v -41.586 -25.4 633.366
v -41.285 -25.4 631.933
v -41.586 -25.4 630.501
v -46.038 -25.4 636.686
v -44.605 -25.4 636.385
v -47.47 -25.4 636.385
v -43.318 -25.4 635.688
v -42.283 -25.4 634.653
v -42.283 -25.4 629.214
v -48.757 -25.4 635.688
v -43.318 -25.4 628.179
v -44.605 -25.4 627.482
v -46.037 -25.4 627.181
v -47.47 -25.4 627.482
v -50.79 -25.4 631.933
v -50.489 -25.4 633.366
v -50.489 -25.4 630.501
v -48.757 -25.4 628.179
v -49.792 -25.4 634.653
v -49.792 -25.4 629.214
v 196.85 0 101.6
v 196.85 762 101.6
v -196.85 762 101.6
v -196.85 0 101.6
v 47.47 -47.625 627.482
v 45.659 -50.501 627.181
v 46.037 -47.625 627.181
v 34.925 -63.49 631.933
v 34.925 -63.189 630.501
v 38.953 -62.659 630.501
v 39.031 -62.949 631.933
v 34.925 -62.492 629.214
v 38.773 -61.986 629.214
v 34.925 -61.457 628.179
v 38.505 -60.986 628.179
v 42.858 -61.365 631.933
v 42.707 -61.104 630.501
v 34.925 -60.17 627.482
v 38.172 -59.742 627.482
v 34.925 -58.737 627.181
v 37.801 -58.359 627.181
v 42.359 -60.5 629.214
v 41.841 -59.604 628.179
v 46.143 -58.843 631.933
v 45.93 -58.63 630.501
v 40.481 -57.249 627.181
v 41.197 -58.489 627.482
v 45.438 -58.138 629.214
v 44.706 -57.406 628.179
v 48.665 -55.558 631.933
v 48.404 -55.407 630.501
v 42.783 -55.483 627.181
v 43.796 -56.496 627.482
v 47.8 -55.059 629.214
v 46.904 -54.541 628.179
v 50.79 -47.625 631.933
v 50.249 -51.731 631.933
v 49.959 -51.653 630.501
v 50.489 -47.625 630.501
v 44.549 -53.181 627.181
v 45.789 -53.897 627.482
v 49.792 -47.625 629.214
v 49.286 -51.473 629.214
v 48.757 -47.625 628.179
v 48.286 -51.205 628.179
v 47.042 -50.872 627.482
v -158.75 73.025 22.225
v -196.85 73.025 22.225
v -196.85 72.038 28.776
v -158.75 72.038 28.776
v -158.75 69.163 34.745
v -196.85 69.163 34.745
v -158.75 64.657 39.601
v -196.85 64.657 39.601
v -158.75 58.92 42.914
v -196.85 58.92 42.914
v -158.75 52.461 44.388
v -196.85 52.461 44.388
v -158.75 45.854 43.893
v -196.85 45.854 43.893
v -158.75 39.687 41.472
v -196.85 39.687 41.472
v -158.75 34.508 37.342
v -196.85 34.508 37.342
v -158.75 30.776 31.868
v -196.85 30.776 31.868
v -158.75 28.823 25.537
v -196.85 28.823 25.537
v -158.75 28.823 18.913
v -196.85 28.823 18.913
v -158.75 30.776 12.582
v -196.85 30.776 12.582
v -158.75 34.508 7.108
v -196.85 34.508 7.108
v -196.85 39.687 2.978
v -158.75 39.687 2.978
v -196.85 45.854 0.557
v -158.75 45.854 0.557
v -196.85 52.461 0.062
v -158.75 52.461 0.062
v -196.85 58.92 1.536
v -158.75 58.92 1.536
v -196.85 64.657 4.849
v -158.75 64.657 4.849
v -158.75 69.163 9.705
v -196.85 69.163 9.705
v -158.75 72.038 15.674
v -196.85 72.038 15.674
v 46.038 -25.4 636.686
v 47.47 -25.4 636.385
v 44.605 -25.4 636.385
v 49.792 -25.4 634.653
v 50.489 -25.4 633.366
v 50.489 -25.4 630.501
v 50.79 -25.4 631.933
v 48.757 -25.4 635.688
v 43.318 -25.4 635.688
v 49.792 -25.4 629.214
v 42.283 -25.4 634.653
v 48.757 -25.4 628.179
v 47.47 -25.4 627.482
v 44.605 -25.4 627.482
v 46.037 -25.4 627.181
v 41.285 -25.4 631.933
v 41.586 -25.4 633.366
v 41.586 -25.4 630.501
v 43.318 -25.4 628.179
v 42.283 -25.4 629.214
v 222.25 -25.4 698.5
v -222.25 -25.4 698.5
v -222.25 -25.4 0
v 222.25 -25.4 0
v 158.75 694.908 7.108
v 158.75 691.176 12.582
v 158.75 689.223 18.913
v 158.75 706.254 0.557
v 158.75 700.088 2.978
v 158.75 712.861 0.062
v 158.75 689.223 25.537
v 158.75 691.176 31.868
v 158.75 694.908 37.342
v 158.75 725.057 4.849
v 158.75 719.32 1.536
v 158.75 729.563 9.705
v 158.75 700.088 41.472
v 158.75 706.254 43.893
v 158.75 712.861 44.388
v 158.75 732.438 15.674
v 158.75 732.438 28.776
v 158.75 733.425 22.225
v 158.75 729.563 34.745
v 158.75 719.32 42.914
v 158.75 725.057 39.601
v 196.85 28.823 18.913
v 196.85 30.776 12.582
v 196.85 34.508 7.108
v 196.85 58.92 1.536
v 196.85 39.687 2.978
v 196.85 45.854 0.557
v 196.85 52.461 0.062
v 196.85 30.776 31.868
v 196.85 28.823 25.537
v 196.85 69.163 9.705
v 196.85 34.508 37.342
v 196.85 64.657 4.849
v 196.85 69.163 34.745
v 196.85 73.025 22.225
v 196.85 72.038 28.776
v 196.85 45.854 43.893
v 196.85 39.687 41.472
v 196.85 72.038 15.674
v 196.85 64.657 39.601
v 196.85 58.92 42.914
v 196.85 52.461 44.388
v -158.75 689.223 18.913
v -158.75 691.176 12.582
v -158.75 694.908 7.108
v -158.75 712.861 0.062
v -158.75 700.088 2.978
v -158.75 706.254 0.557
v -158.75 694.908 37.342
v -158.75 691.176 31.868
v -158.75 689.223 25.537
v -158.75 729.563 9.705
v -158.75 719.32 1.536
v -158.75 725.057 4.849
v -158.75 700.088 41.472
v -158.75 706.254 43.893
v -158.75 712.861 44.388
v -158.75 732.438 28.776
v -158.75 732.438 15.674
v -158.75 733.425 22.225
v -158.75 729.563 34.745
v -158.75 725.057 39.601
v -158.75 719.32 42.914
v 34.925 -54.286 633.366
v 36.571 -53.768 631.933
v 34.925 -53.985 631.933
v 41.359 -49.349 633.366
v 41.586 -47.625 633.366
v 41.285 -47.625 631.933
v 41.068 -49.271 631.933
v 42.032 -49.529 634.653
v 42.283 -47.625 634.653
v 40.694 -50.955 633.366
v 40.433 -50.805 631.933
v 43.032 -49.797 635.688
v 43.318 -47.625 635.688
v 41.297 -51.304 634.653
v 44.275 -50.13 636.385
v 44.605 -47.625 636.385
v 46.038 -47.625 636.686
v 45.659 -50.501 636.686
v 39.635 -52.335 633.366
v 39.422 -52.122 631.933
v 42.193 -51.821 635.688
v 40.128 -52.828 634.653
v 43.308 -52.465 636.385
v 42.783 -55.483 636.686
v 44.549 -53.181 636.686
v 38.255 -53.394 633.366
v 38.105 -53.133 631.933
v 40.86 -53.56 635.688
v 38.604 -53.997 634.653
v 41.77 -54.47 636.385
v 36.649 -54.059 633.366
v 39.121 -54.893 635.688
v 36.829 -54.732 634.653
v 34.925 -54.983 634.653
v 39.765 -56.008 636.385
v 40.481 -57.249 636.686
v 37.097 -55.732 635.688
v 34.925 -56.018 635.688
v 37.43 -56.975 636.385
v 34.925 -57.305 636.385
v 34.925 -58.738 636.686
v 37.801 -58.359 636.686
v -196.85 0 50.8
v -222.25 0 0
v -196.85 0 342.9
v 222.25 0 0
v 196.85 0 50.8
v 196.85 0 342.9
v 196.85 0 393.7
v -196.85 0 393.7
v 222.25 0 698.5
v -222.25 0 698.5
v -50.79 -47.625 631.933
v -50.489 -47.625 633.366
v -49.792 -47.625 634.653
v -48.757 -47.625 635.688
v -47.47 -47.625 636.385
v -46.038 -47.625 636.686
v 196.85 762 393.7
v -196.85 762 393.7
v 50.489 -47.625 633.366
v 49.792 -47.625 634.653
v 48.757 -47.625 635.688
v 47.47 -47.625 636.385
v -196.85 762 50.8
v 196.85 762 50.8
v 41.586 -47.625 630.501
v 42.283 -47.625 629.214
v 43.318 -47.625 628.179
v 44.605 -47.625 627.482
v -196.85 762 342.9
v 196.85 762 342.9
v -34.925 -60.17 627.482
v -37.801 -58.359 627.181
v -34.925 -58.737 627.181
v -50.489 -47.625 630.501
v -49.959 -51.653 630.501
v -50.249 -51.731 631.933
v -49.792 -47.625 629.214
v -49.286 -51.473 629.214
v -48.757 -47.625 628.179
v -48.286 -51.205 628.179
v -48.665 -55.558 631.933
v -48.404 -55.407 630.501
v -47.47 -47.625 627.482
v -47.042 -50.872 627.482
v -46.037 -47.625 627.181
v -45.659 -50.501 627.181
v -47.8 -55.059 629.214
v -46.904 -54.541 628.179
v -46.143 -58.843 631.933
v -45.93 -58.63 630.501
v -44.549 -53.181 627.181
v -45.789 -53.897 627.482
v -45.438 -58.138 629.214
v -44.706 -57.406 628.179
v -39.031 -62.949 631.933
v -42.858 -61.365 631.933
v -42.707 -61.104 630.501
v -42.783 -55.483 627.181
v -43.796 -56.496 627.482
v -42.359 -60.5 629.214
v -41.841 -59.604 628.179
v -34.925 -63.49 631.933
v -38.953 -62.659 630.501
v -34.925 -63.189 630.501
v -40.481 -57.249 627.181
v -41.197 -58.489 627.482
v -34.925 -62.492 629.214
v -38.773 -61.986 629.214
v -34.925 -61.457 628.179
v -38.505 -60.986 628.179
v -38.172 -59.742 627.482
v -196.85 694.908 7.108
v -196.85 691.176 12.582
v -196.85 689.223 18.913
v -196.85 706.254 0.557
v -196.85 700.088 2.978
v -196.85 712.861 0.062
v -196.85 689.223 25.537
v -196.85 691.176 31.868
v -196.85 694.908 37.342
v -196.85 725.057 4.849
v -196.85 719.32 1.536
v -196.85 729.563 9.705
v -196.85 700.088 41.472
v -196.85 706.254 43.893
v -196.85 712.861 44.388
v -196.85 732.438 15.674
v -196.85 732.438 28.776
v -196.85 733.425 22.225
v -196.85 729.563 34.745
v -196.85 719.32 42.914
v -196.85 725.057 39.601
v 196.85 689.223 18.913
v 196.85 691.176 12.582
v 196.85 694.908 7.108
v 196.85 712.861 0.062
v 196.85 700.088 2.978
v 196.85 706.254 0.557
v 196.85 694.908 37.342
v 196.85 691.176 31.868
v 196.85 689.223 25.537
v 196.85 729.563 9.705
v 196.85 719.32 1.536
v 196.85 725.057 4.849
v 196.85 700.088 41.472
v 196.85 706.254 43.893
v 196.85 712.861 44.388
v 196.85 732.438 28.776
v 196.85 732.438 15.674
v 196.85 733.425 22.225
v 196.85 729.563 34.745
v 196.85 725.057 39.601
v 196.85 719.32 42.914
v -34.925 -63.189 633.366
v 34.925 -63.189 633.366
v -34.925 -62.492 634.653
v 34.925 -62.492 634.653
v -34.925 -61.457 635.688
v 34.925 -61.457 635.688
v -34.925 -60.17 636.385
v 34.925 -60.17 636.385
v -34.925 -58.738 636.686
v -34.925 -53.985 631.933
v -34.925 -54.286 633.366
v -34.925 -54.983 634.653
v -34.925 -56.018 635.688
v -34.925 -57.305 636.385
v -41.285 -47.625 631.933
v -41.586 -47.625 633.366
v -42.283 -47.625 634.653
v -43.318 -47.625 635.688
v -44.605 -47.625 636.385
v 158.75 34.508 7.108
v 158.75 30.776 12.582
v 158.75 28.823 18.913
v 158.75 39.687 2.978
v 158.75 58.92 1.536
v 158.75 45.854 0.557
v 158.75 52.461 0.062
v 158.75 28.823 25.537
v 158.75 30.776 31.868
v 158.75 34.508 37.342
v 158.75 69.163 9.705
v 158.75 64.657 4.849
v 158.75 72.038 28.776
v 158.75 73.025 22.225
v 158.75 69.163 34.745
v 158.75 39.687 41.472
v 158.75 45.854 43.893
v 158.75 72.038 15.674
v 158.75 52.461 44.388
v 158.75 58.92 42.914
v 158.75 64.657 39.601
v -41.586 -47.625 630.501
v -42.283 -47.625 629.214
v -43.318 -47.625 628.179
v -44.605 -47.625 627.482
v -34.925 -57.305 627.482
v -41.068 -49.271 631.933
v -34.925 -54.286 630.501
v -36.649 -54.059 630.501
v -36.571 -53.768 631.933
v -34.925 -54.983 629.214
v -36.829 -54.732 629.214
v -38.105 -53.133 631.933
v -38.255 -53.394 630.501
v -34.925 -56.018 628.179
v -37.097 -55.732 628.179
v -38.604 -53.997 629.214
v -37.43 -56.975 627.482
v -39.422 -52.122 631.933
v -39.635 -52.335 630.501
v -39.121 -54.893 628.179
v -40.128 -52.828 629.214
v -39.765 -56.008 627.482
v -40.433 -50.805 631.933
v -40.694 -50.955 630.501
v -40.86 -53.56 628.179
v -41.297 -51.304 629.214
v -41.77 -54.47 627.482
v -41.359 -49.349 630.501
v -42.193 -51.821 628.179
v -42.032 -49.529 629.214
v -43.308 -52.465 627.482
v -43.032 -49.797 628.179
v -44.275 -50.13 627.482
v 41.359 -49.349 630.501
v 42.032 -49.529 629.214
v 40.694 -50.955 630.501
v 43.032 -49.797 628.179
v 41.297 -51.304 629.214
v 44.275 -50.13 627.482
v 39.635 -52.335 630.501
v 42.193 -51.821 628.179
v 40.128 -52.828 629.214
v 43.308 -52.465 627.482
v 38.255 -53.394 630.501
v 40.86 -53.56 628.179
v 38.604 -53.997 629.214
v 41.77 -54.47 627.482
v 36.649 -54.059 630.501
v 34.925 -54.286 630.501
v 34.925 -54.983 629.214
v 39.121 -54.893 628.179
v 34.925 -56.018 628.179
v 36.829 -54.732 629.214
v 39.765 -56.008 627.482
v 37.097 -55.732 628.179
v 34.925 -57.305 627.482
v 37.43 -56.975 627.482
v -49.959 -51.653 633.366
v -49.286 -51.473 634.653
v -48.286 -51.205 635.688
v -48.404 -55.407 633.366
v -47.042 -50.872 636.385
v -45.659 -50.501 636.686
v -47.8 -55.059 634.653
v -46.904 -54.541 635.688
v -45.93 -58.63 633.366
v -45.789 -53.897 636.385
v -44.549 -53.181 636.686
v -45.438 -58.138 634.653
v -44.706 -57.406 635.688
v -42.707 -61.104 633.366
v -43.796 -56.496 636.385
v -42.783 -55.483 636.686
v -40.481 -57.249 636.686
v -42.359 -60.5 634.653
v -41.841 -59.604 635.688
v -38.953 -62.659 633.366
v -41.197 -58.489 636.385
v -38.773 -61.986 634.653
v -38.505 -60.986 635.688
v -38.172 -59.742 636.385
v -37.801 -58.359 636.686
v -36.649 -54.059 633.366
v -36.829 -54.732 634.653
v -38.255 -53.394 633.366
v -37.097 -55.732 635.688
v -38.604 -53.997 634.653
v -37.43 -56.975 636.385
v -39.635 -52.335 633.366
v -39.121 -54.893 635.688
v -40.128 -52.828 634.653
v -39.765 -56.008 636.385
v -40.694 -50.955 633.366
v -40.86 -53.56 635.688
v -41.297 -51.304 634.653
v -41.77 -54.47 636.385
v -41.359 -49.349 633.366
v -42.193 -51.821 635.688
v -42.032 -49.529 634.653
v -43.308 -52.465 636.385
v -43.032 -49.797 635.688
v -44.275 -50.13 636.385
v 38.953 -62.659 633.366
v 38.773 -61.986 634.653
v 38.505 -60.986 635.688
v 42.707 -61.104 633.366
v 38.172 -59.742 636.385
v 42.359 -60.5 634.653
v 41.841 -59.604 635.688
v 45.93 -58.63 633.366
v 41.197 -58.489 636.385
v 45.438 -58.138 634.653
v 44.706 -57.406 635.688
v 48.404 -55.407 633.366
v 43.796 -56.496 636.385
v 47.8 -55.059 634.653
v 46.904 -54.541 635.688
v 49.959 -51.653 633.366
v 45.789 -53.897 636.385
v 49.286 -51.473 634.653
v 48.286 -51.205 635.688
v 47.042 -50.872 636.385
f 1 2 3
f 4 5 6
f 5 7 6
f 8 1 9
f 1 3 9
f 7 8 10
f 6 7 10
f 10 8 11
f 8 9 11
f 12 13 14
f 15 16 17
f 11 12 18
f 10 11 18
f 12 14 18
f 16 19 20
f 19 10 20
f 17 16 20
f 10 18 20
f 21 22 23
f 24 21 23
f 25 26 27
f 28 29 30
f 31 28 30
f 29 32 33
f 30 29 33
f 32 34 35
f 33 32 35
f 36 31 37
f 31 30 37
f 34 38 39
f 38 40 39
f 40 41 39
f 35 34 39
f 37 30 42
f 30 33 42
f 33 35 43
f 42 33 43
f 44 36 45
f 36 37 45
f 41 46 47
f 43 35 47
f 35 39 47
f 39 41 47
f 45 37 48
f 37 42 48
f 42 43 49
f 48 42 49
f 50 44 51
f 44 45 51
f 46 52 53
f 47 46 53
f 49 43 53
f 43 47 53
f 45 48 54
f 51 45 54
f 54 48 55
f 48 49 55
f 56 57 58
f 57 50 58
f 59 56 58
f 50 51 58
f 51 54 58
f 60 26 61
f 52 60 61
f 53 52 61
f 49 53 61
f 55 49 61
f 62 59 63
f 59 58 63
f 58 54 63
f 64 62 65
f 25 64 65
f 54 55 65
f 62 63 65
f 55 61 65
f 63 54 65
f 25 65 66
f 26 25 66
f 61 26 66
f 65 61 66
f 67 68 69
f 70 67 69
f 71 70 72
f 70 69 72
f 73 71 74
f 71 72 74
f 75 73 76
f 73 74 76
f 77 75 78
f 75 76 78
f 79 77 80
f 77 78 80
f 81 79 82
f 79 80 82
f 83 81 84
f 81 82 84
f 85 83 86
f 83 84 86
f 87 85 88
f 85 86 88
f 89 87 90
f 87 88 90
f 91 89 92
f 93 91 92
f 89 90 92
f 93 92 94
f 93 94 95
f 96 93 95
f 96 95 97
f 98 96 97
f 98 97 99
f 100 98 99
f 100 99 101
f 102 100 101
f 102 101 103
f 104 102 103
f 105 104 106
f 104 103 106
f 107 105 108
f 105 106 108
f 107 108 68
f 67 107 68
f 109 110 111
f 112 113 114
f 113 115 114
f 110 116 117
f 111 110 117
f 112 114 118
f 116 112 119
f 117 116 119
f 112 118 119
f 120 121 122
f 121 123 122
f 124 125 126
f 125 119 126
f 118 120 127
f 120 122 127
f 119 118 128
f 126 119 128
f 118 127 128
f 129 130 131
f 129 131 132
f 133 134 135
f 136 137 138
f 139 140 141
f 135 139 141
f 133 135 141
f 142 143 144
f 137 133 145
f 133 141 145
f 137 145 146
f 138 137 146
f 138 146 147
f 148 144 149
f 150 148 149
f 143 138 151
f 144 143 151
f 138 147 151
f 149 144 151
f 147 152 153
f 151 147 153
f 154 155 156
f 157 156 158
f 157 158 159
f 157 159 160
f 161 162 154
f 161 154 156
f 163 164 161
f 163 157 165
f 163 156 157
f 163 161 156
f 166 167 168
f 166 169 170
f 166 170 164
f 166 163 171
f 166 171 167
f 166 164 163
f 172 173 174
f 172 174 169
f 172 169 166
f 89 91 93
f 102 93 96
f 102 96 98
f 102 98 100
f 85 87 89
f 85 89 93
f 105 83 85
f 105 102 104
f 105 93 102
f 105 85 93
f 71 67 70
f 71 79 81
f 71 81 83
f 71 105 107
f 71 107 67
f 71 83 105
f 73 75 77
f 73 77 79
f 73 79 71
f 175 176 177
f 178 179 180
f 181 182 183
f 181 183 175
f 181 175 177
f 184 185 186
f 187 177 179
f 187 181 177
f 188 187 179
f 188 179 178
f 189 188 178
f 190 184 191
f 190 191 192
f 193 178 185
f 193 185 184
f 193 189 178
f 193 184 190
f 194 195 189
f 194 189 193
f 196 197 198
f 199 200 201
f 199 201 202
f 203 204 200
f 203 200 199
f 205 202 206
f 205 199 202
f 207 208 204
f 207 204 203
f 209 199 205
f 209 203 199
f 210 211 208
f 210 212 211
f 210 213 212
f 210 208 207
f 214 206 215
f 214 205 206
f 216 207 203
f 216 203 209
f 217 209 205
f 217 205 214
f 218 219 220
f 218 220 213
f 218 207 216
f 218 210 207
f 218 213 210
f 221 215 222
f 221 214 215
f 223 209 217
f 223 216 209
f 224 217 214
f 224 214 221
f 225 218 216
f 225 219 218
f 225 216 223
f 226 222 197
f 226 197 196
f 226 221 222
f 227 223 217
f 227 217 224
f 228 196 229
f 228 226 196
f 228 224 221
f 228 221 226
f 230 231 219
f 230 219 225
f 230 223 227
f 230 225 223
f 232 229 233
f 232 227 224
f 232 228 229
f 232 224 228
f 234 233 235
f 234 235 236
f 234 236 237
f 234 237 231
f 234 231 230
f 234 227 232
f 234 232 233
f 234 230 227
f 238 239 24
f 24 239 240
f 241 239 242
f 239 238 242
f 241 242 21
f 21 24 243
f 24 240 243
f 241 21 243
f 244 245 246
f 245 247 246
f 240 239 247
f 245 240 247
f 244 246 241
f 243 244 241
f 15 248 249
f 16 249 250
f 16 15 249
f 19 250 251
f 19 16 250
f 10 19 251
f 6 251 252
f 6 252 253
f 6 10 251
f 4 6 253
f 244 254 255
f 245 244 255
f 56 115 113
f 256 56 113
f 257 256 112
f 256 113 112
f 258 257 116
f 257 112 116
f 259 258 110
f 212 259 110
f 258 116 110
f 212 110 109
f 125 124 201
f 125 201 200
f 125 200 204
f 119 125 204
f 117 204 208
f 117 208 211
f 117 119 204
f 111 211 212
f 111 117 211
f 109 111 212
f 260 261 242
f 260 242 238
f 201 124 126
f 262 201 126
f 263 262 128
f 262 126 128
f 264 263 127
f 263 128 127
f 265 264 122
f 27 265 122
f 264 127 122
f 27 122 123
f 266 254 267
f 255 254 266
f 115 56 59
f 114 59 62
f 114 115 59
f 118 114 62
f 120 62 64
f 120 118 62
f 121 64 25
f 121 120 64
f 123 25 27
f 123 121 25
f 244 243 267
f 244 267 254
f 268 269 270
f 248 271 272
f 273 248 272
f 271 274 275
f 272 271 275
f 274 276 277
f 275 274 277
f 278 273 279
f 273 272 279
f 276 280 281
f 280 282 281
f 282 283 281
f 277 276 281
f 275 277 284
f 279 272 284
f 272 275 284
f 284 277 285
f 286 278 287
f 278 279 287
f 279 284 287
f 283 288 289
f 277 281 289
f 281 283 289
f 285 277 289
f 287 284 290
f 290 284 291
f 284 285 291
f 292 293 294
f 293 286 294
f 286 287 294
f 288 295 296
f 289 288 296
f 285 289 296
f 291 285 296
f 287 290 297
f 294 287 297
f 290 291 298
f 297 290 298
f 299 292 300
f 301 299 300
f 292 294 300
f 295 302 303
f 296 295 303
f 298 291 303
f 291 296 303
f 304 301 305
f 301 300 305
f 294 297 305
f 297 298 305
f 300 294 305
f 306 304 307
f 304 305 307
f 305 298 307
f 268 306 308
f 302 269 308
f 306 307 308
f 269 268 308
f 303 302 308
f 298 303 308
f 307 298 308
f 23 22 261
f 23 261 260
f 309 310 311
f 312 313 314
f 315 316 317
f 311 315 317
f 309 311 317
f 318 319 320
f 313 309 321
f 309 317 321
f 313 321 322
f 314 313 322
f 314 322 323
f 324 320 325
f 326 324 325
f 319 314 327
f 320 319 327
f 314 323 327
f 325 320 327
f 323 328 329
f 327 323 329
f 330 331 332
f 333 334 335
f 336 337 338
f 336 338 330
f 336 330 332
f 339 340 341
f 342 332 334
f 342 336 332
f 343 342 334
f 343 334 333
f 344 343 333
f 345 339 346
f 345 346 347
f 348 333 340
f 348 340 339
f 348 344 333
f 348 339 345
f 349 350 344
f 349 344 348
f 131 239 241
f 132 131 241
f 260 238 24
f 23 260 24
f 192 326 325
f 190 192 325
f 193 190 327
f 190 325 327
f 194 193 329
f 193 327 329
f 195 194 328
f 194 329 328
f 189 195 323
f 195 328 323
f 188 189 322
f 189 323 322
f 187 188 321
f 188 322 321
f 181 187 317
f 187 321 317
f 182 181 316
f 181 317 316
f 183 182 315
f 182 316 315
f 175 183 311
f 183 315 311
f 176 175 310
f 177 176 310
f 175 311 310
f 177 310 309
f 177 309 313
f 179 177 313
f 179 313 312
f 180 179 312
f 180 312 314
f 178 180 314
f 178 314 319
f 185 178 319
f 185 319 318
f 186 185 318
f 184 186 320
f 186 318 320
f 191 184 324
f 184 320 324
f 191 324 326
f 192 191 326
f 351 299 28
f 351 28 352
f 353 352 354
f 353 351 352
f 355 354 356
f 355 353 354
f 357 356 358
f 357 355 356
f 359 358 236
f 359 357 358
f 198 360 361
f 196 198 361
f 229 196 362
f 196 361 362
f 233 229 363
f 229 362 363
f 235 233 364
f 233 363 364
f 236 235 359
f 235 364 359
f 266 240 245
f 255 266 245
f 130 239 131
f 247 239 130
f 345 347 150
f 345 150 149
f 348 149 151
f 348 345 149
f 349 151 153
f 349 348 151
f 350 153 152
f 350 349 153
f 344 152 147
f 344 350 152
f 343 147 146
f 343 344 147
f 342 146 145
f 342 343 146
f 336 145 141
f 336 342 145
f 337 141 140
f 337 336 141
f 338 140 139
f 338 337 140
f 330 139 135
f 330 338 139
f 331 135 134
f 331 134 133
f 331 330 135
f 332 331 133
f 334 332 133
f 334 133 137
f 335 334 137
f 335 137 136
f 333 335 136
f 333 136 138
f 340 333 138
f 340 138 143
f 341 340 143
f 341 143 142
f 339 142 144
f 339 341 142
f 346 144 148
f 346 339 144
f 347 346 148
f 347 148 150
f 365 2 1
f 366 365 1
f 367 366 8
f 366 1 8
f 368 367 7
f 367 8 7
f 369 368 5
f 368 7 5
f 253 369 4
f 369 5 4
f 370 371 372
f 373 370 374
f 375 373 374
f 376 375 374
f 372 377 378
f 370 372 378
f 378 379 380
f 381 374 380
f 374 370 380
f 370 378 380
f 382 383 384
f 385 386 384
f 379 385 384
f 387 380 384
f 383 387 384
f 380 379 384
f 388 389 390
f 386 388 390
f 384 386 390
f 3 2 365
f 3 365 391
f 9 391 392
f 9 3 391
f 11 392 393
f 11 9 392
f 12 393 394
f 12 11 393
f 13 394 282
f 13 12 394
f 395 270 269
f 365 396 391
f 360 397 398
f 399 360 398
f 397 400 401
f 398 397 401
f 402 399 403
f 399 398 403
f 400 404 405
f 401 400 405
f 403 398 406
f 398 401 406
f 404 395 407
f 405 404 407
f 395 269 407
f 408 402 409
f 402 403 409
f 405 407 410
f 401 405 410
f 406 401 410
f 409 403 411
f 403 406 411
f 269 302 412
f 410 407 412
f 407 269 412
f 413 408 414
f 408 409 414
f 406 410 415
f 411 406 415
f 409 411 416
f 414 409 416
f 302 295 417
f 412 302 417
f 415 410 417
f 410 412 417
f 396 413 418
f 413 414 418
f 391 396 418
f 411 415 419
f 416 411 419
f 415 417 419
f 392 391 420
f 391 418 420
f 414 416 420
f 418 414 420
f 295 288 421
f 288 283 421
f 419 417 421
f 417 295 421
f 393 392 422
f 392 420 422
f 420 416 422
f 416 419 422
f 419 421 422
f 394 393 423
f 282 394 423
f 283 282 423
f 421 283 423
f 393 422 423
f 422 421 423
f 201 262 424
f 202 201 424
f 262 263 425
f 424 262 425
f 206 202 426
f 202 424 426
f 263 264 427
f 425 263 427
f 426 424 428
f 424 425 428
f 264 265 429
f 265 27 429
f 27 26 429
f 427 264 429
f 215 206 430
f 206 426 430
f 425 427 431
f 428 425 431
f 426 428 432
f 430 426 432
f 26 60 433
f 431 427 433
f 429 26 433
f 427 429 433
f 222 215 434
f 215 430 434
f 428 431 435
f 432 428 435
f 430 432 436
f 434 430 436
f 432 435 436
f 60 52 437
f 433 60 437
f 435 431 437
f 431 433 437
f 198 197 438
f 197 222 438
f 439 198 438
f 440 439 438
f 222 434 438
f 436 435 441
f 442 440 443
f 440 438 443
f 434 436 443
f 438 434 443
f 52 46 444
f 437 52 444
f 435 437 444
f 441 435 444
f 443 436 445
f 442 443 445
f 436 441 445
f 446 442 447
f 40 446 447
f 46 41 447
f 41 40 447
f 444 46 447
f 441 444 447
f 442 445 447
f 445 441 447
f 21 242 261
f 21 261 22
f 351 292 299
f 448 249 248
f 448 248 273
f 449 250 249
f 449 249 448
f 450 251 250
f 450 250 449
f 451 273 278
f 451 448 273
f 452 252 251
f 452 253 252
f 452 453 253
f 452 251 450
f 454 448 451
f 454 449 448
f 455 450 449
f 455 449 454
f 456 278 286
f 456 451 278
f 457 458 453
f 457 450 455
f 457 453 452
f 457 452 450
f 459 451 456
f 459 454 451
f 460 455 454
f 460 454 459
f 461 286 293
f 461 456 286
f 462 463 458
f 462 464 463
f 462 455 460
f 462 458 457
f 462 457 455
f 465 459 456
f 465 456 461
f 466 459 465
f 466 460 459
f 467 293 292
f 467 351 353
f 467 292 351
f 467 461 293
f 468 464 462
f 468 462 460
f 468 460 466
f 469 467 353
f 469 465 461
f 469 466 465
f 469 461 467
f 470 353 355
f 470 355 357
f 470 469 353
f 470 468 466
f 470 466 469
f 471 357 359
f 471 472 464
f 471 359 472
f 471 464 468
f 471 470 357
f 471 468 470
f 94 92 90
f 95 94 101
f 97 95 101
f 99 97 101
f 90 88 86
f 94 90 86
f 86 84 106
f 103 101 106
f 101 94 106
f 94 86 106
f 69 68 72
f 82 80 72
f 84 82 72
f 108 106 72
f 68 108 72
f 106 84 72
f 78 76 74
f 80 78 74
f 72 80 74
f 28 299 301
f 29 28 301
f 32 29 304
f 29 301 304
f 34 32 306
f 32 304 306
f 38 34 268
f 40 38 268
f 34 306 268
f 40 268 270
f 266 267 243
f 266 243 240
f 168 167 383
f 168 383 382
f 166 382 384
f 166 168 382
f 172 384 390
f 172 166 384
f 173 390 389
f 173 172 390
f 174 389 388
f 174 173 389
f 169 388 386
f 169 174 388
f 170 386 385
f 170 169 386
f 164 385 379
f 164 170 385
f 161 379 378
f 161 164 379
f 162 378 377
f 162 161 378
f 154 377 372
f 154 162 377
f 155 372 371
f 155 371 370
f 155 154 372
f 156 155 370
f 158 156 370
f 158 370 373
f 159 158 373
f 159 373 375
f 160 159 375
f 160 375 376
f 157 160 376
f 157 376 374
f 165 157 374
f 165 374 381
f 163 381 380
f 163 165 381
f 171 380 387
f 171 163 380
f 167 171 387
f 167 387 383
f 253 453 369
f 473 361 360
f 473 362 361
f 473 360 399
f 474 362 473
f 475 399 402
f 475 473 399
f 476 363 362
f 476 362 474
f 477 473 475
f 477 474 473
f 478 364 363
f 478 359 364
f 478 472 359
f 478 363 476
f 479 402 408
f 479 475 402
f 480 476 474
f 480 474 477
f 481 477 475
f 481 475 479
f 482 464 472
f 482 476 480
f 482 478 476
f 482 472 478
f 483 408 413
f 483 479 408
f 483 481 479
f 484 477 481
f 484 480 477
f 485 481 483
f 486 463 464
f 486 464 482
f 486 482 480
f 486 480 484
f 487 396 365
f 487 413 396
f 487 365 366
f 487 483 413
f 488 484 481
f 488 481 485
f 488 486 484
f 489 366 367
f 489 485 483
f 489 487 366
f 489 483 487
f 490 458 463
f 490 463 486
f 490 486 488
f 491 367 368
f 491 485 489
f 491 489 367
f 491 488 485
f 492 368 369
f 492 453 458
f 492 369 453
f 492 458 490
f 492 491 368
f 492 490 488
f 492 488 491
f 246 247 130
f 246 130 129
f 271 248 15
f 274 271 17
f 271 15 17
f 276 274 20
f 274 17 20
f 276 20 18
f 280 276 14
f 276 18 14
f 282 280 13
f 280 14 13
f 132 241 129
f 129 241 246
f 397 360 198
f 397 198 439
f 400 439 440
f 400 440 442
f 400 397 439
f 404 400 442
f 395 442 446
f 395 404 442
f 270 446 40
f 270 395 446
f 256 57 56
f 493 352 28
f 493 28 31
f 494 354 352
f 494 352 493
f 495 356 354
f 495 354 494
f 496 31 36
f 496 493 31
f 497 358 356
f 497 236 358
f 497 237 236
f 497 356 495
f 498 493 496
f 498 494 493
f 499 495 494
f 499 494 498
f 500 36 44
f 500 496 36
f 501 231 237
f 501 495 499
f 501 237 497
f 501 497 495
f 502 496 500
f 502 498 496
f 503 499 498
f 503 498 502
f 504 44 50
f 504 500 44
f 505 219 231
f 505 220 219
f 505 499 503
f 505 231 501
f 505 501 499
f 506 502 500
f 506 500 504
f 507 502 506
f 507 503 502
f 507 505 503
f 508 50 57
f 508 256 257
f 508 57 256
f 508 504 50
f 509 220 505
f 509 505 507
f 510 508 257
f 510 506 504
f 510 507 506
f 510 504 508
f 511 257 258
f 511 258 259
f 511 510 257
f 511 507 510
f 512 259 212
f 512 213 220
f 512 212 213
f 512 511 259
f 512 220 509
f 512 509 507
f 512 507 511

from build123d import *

# Parameters (mm, degrees)
F0_W          = 444.5
F0_H          = 698.5
F1_DEPTH      = 25.4
F2_W          = 393.7
F2_H          = 50.8
F3_DEPTH      = 762
F4_R          = 22.225
F5_DEPTH      = 38.1
F8_DEPTH      = 9.525
F10_T1_DEPTH  = 34.925
F10_T3_DEPTH  = 69.85
F10_T6_ANGLE  = 90
F10_T8_ANGLE  = 90
F10_T10_ANGLE = 90
F10_T12_ANGLE = 90
F10_T14_ANGLE = 90
F10_T16_ANGLE = 90
F10_T18_ANGLE = 90
F10_T20_ANGLE = 90


# Not quite as in the source:
# - a fillet or chamfer that OpenCascade refuses, or shapes differently, is made with other operations: its cross-section is extruded or revolved along the edge and cut away or added


with BuildPart() as f1:
    # F0 (on Front) → F1 (new body)
    with BuildSketch(Plane.XZ):
        with Locations((0, 349.25)):
            Rectangle(F0_W, F0_H)
    extrude(amount=F1_DEPTH)

    # F2 (on face) → F3 (join)
    with BuildSketch(Plane(origin=(0, 0, 0), x_dir=(-1, 0, 0), z_dir=(0, 1, 0))):
        with Locations((0, 368.3)):
            Rectangle(F2_W, F2_H)
        with Locations((0, 76.2)):
            Rectangle(F2_W, F2_H)
    extrude(amount=F3_DEPTH)


with BuildPart() as f5:
    # F4 (on face) → F5 (new body)
    with BuildSketch(Plane.YZ.offset(196.85)):
        with Locations((50.8, 22.225)):
            Circle(F4_R)
    extrude(amount=-F5_DEPTH)


with BuildPart() as f5b:
    # F4 (on face) → F5, piece 2 (new body)
    with BuildSketch(Plane.YZ.offset(196.85)):
        with Locations((711.2, 22.225)):
            Circle(F4_R)
    extrude(amount=-F5_DEPTH)


with BuildPart() as f6_1:
    # F6: instance of F5
    add(f5.part.mirror(Plane.YZ))


with BuildPart() as f6_2:
    # F6: instance of F5b
    add(f5b.part.mirror(Plane.YZ))


with BuildPart() as f8:
    # F7 (on Top) → F8 (new body)
    with BuildSketch(Plane.XY):
        with BuildLine():
            Line((-41.275, -25.4), (-50.8, -25.4))
            Line((-50.8, -25.4), (-50.8, -47.625))
            ThreePointArc((-50.8, -47.625), (-46.1503201513, -58.8503201513), (-34.925, -63.5))
            Line((-34.925, -63.5), (34.925, -63.5))
            ThreePointArc((34.925, -63.5), (46.1503201513, -58.8503201513), (50.8, -47.625))
            Line((50.8, -47.625), (50.8, -25.4))
            Line((50.8, -25.4), (41.275, -25.4))
            Line((41.275, -25.4), (41.275, -47.625))
            ThreePointArc((41.275, -47.625), (39.4151280605, -52.1151280605), (34.925, -53.975))
            Line((34.925, -53.975), (-34.925, -53.975))
            ThreePointArc((-34.925, -53.975), (-39.4151280605, -52.1151280605), (-41.275, -47.625))
            Line((-41.275, -47.625), (-41.275, -25.4))
        make_face()
    extrude(amount=F8_DEPTH)


with BuildPart() as f8_1:
    # F9: moved
    add(f8.part.moved(Location((0, 0, 627.1708))))

    # F10: fillet of radius 5.08 on 4 edges, made by hand

    # F10_s2 → F10_t1 (cut)
    with BuildSketch(Plane.XZ.offset(12.7)):
        with BuildLine():
            ThreePointArc((-41.275, 631.6158), (-42.7628975516, 635.2079024484), (-46.355, 636.6958))
            Line((-46.355, 636.6958), (-41.275, 636.6958))
            Line((-41.275, 636.6958), (-41.275, 631.6158))
        make_face()
        with BuildLine():
            ThreePointArc((-50.8, 631.6158), (-49.3121024484, 635.2079024484), (-45.72, 636.6958))
            Line((-45.72, 636.6958), (-50.8, 636.6958))
            Line((-50.8, 636.6958), (-50.8, 631.6158))
        make_face()
        with BuildLine():
            ThreePointArc((-41.275, 632.2508), (-42.7628975516, 628.6586975516), (-46.355, 627.1708))
            Line((-46.355, 627.1708), (-41.275, 627.1708))
            Line((-41.275, 627.1708), (-41.275, 632.2508))
        make_face()
        with BuildLine():
            ThreePointArc((50.8, 632.2508), (49.3121024484, 628.6586975516), (45.72, 627.1708))
            Line((45.72, 627.1708), (50.8, 627.1708))
            Line((50.8, 627.1708), (50.8, 632.2508))
        make_face()
        with BuildLine():
            ThreePointArc((-50.8, 632.2508), (-49.3121024484, 628.6586975516), (-45.72, 627.1708))
            Line((-45.72, 627.1708), (-50.8, 627.1708))
            Line((-50.8, 627.1708), (-50.8, 632.2508))
        make_face()
        with BuildLine():
            ThreePointArc((41.275, 632.2508), (42.7628975516, 628.6586975516), (46.355, 627.1708))
            Line((46.355, 627.1708), (41.275, 627.1708))
            Line((41.275, 627.1708), (41.275, 632.2508))
        make_face()
        with BuildLine():
            ThreePointArc((50.8, 631.6158), (49.3121024484, 635.2079024484), (45.72, 636.6958))
            Line((45.72, 636.6958), (50.8, 636.6958))
            Line((50.8, 636.6958), (50.8, 631.6158))
        make_face()
        with BuildLine():
            ThreePointArc((41.275, 631.6158), (42.7628975516, 635.2079024484), (46.355, 636.6958))
            Line((46.355, 636.6958), (41.275, 636.6958))
            Line((41.275, 636.6958), (41.275, 631.6158))
        make_face()
    extrude(amount=F10_T1_DEPTH, mode=Mode.SUBTRACT)

    # F10_s4 → F10_t3 (cut)
    with BuildSketch(Plane.YZ.offset(-34.925)):
        with BuildLine():
            ThreePointArc((-63.5, 632.2508), (-62.0121024484, 628.6586975516), (-58.42, 627.1708))
            Line((-58.42, 627.1708), (-63.5, 627.1708))
            Line((-63.5, 627.1708), (-63.5, 632.2508))
        make_face()
        with BuildLine():
            ThreePointArc((-53.975, 632.2508), (-55.4628975516, 628.6586975516), (-59.055, 627.1708))
            Line((-59.055, 627.1708), (-53.975, 627.1708))
            Line((-53.975, 627.1708), (-53.975, 632.2508))
        make_face()
        with BuildLine():
            ThreePointArc((-63.5, 631.6158), (-62.0121024484, 635.2079024484), (-58.42, 636.6958))
            Line((-58.42, 636.6958), (-63.5, 636.6958))
            Line((-63.5, 636.6958), (-63.5, 631.6158))
        make_face()
        with BuildLine():
            ThreePointArc((-53.975, 631.6158), (-55.4628975516, 635.2079024484), (-59.055, 636.6958))
            Line((-59.055, 636.6958), (-53.975, 636.6958))
            Line((-53.975, 636.6958), (-53.975, 631.6158))
        make_face()
    extrude(amount=F10_T3_DEPTH, mode=Mode.SUBTRACT)

    # F10_s5 → F10_t6 (revolve, cut)
    with BuildSketch(Plane.XZ.offset(47.625)):
        with BuildLine():
            ThreePointArc((-50.8, 632.2508), (-49.3121024484, 628.6586975516), (-45.72, 627.1708))
            Line((-45.72, 627.1708), (-50.8, 627.1708))
            Line((-50.8, 627.1708), (-50.8, 632.2508))
        make_face()
    revolve(axis=Axis((-34.925, -47.625, 627.1708), (0, 0, 1)), revolution_arc=F10_T6_ANGLE, mode=Mode.SUBTRACT)

    # F10_s7 → F10_t8 (revolve, cut)
    with BuildSketch(Plane.YZ.offset(34.925)):
        with BuildLine():
            ThreePointArc((-63.5, 632.2508), (-62.0121024484, 628.6586975516), (-58.42, 627.1708))
            Line((-58.42, 627.1708), (-63.5, 627.1708))
            Line((-63.5, 627.1708), (-63.5, 632.2508))
        make_face()
    revolve(axis=Axis((34.925, -47.625, 627.1708), (0, 0, 1)), revolution_arc=F10_T8_ANGLE, mode=Mode.SUBTRACT)

    # F10_s9 → F10_t10 (revolve, cut)
    with BuildSketch(Plane.YZ.offset(-34.925)):
        with BuildLine():
            ThreePointArc((-53.975, 632.2508), (-55.4628975516, 628.6586975516), (-59.055, 627.1708))
            Line((-59.055, 627.1708), (-53.975, 627.1708))
            Line((-53.975, 627.1708), (-53.975, 632.2508))
        make_face()
    revolve(axis=Axis((-34.925, -47.625, 627.1708), (0, 0, -1)), revolution_arc=F10_T10_ANGLE, mode=Mode.SUBTRACT)

    # F10_s11 → F10_t12 (revolve, cut)
    with BuildSketch(Plane.XZ.offset(47.625)):
        with BuildLine():
            ThreePointArc((41.275, 632.2508), (42.7628975516, 628.6586975516), (46.355, 627.1708))
            Line((46.355, 627.1708), (41.275, 627.1708))
            Line((41.275, 627.1708), (41.275, 632.2508))
        make_face()
    revolve(axis=Axis((34.925, -47.625, 627.1708), (0, 0, -1)), revolution_arc=F10_T12_ANGLE, mode=Mode.SUBTRACT)

    # F10_s13 → F10_t14 (revolve, cut)
    with BuildSketch(Plane.XZ.offset(47.625)):
        with BuildLine():
            ThreePointArc((-50.8, 631.6158), (-49.3121024484, 635.2079024484), (-45.72, 636.6958))
            Line((-45.72, 636.6958), (-50.8, 636.6958))
            Line((-50.8, 636.6958), (-50.8, 631.6158))
        make_face()
    revolve(axis=Axis((-34.925, -47.625, 636.6958), (0, 0, 1)), revolution_arc=F10_T14_ANGLE, mode=Mode.SUBTRACT)

    # F10_s15 → F10_t16 (revolve, cut)
    with BuildSketch(Plane.YZ.offset(34.925)):
        with BuildLine():
            ThreePointArc((-63.5, 631.6158), (-62.0121024484, 635.2079024484), (-58.42, 636.6958))
            Line((-58.42, 636.6958), (-63.5, 636.6958))
            Line((-63.5, 636.6958), (-63.5, 631.6158))
        make_face()
    revolve(axis=Axis((34.925, -47.625, 636.6958), (0, 0, 1)), revolution_arc=F10_T16_ANGLE, mode=Mode.SUBTRACT)

    # F10_s17 → F10_t18 (revolve, cut)
    with BuildSketch(Plane.YZ.offset(-34.925)):
        with BuildLine():
            ThreePointArc((-53.975, 631.6158), (-55.4628975516, 635.2079024484), (-59.055, 636.6958))
            Line((-59.055, 636.6958), (-53.975, 636.6958))
            Line((-53.975, 636.6958), (-53.975, 631.6158))
        make_face()
    revolve(axis=Axis((-34.925, -47.625, 636.6958), (0, 0, -1)), revolution_arc=F10_T18_ANGLE, mode=Mode.SUBTRACT)

    # F10_s19 → F10_t20 (revolve, cut)
    with BuildSketch(Plane.XZ.offset(47.625)):
        with BuildLine():
            ThreePointArc((41.275, 631.6158), (42.7628975516, 635.2079024484), (46.355, 636.6958))
            Line((46.355, 636.6958), (41.275, 636.6958))
            Line((41.275, 636.6958), (41.275, 631.6158))
        make_face()
    revolve(axis=Axis((34.925, -47.625, 636.6958), (0, 0, -1)), revolution_arc=F10_T20_ANGLE, mode=Mode.SUBTRACT)


solid = Compound([f1.part, f5.part, f5b.part, f6_1.part, f6_2.part, f8_1.part])
